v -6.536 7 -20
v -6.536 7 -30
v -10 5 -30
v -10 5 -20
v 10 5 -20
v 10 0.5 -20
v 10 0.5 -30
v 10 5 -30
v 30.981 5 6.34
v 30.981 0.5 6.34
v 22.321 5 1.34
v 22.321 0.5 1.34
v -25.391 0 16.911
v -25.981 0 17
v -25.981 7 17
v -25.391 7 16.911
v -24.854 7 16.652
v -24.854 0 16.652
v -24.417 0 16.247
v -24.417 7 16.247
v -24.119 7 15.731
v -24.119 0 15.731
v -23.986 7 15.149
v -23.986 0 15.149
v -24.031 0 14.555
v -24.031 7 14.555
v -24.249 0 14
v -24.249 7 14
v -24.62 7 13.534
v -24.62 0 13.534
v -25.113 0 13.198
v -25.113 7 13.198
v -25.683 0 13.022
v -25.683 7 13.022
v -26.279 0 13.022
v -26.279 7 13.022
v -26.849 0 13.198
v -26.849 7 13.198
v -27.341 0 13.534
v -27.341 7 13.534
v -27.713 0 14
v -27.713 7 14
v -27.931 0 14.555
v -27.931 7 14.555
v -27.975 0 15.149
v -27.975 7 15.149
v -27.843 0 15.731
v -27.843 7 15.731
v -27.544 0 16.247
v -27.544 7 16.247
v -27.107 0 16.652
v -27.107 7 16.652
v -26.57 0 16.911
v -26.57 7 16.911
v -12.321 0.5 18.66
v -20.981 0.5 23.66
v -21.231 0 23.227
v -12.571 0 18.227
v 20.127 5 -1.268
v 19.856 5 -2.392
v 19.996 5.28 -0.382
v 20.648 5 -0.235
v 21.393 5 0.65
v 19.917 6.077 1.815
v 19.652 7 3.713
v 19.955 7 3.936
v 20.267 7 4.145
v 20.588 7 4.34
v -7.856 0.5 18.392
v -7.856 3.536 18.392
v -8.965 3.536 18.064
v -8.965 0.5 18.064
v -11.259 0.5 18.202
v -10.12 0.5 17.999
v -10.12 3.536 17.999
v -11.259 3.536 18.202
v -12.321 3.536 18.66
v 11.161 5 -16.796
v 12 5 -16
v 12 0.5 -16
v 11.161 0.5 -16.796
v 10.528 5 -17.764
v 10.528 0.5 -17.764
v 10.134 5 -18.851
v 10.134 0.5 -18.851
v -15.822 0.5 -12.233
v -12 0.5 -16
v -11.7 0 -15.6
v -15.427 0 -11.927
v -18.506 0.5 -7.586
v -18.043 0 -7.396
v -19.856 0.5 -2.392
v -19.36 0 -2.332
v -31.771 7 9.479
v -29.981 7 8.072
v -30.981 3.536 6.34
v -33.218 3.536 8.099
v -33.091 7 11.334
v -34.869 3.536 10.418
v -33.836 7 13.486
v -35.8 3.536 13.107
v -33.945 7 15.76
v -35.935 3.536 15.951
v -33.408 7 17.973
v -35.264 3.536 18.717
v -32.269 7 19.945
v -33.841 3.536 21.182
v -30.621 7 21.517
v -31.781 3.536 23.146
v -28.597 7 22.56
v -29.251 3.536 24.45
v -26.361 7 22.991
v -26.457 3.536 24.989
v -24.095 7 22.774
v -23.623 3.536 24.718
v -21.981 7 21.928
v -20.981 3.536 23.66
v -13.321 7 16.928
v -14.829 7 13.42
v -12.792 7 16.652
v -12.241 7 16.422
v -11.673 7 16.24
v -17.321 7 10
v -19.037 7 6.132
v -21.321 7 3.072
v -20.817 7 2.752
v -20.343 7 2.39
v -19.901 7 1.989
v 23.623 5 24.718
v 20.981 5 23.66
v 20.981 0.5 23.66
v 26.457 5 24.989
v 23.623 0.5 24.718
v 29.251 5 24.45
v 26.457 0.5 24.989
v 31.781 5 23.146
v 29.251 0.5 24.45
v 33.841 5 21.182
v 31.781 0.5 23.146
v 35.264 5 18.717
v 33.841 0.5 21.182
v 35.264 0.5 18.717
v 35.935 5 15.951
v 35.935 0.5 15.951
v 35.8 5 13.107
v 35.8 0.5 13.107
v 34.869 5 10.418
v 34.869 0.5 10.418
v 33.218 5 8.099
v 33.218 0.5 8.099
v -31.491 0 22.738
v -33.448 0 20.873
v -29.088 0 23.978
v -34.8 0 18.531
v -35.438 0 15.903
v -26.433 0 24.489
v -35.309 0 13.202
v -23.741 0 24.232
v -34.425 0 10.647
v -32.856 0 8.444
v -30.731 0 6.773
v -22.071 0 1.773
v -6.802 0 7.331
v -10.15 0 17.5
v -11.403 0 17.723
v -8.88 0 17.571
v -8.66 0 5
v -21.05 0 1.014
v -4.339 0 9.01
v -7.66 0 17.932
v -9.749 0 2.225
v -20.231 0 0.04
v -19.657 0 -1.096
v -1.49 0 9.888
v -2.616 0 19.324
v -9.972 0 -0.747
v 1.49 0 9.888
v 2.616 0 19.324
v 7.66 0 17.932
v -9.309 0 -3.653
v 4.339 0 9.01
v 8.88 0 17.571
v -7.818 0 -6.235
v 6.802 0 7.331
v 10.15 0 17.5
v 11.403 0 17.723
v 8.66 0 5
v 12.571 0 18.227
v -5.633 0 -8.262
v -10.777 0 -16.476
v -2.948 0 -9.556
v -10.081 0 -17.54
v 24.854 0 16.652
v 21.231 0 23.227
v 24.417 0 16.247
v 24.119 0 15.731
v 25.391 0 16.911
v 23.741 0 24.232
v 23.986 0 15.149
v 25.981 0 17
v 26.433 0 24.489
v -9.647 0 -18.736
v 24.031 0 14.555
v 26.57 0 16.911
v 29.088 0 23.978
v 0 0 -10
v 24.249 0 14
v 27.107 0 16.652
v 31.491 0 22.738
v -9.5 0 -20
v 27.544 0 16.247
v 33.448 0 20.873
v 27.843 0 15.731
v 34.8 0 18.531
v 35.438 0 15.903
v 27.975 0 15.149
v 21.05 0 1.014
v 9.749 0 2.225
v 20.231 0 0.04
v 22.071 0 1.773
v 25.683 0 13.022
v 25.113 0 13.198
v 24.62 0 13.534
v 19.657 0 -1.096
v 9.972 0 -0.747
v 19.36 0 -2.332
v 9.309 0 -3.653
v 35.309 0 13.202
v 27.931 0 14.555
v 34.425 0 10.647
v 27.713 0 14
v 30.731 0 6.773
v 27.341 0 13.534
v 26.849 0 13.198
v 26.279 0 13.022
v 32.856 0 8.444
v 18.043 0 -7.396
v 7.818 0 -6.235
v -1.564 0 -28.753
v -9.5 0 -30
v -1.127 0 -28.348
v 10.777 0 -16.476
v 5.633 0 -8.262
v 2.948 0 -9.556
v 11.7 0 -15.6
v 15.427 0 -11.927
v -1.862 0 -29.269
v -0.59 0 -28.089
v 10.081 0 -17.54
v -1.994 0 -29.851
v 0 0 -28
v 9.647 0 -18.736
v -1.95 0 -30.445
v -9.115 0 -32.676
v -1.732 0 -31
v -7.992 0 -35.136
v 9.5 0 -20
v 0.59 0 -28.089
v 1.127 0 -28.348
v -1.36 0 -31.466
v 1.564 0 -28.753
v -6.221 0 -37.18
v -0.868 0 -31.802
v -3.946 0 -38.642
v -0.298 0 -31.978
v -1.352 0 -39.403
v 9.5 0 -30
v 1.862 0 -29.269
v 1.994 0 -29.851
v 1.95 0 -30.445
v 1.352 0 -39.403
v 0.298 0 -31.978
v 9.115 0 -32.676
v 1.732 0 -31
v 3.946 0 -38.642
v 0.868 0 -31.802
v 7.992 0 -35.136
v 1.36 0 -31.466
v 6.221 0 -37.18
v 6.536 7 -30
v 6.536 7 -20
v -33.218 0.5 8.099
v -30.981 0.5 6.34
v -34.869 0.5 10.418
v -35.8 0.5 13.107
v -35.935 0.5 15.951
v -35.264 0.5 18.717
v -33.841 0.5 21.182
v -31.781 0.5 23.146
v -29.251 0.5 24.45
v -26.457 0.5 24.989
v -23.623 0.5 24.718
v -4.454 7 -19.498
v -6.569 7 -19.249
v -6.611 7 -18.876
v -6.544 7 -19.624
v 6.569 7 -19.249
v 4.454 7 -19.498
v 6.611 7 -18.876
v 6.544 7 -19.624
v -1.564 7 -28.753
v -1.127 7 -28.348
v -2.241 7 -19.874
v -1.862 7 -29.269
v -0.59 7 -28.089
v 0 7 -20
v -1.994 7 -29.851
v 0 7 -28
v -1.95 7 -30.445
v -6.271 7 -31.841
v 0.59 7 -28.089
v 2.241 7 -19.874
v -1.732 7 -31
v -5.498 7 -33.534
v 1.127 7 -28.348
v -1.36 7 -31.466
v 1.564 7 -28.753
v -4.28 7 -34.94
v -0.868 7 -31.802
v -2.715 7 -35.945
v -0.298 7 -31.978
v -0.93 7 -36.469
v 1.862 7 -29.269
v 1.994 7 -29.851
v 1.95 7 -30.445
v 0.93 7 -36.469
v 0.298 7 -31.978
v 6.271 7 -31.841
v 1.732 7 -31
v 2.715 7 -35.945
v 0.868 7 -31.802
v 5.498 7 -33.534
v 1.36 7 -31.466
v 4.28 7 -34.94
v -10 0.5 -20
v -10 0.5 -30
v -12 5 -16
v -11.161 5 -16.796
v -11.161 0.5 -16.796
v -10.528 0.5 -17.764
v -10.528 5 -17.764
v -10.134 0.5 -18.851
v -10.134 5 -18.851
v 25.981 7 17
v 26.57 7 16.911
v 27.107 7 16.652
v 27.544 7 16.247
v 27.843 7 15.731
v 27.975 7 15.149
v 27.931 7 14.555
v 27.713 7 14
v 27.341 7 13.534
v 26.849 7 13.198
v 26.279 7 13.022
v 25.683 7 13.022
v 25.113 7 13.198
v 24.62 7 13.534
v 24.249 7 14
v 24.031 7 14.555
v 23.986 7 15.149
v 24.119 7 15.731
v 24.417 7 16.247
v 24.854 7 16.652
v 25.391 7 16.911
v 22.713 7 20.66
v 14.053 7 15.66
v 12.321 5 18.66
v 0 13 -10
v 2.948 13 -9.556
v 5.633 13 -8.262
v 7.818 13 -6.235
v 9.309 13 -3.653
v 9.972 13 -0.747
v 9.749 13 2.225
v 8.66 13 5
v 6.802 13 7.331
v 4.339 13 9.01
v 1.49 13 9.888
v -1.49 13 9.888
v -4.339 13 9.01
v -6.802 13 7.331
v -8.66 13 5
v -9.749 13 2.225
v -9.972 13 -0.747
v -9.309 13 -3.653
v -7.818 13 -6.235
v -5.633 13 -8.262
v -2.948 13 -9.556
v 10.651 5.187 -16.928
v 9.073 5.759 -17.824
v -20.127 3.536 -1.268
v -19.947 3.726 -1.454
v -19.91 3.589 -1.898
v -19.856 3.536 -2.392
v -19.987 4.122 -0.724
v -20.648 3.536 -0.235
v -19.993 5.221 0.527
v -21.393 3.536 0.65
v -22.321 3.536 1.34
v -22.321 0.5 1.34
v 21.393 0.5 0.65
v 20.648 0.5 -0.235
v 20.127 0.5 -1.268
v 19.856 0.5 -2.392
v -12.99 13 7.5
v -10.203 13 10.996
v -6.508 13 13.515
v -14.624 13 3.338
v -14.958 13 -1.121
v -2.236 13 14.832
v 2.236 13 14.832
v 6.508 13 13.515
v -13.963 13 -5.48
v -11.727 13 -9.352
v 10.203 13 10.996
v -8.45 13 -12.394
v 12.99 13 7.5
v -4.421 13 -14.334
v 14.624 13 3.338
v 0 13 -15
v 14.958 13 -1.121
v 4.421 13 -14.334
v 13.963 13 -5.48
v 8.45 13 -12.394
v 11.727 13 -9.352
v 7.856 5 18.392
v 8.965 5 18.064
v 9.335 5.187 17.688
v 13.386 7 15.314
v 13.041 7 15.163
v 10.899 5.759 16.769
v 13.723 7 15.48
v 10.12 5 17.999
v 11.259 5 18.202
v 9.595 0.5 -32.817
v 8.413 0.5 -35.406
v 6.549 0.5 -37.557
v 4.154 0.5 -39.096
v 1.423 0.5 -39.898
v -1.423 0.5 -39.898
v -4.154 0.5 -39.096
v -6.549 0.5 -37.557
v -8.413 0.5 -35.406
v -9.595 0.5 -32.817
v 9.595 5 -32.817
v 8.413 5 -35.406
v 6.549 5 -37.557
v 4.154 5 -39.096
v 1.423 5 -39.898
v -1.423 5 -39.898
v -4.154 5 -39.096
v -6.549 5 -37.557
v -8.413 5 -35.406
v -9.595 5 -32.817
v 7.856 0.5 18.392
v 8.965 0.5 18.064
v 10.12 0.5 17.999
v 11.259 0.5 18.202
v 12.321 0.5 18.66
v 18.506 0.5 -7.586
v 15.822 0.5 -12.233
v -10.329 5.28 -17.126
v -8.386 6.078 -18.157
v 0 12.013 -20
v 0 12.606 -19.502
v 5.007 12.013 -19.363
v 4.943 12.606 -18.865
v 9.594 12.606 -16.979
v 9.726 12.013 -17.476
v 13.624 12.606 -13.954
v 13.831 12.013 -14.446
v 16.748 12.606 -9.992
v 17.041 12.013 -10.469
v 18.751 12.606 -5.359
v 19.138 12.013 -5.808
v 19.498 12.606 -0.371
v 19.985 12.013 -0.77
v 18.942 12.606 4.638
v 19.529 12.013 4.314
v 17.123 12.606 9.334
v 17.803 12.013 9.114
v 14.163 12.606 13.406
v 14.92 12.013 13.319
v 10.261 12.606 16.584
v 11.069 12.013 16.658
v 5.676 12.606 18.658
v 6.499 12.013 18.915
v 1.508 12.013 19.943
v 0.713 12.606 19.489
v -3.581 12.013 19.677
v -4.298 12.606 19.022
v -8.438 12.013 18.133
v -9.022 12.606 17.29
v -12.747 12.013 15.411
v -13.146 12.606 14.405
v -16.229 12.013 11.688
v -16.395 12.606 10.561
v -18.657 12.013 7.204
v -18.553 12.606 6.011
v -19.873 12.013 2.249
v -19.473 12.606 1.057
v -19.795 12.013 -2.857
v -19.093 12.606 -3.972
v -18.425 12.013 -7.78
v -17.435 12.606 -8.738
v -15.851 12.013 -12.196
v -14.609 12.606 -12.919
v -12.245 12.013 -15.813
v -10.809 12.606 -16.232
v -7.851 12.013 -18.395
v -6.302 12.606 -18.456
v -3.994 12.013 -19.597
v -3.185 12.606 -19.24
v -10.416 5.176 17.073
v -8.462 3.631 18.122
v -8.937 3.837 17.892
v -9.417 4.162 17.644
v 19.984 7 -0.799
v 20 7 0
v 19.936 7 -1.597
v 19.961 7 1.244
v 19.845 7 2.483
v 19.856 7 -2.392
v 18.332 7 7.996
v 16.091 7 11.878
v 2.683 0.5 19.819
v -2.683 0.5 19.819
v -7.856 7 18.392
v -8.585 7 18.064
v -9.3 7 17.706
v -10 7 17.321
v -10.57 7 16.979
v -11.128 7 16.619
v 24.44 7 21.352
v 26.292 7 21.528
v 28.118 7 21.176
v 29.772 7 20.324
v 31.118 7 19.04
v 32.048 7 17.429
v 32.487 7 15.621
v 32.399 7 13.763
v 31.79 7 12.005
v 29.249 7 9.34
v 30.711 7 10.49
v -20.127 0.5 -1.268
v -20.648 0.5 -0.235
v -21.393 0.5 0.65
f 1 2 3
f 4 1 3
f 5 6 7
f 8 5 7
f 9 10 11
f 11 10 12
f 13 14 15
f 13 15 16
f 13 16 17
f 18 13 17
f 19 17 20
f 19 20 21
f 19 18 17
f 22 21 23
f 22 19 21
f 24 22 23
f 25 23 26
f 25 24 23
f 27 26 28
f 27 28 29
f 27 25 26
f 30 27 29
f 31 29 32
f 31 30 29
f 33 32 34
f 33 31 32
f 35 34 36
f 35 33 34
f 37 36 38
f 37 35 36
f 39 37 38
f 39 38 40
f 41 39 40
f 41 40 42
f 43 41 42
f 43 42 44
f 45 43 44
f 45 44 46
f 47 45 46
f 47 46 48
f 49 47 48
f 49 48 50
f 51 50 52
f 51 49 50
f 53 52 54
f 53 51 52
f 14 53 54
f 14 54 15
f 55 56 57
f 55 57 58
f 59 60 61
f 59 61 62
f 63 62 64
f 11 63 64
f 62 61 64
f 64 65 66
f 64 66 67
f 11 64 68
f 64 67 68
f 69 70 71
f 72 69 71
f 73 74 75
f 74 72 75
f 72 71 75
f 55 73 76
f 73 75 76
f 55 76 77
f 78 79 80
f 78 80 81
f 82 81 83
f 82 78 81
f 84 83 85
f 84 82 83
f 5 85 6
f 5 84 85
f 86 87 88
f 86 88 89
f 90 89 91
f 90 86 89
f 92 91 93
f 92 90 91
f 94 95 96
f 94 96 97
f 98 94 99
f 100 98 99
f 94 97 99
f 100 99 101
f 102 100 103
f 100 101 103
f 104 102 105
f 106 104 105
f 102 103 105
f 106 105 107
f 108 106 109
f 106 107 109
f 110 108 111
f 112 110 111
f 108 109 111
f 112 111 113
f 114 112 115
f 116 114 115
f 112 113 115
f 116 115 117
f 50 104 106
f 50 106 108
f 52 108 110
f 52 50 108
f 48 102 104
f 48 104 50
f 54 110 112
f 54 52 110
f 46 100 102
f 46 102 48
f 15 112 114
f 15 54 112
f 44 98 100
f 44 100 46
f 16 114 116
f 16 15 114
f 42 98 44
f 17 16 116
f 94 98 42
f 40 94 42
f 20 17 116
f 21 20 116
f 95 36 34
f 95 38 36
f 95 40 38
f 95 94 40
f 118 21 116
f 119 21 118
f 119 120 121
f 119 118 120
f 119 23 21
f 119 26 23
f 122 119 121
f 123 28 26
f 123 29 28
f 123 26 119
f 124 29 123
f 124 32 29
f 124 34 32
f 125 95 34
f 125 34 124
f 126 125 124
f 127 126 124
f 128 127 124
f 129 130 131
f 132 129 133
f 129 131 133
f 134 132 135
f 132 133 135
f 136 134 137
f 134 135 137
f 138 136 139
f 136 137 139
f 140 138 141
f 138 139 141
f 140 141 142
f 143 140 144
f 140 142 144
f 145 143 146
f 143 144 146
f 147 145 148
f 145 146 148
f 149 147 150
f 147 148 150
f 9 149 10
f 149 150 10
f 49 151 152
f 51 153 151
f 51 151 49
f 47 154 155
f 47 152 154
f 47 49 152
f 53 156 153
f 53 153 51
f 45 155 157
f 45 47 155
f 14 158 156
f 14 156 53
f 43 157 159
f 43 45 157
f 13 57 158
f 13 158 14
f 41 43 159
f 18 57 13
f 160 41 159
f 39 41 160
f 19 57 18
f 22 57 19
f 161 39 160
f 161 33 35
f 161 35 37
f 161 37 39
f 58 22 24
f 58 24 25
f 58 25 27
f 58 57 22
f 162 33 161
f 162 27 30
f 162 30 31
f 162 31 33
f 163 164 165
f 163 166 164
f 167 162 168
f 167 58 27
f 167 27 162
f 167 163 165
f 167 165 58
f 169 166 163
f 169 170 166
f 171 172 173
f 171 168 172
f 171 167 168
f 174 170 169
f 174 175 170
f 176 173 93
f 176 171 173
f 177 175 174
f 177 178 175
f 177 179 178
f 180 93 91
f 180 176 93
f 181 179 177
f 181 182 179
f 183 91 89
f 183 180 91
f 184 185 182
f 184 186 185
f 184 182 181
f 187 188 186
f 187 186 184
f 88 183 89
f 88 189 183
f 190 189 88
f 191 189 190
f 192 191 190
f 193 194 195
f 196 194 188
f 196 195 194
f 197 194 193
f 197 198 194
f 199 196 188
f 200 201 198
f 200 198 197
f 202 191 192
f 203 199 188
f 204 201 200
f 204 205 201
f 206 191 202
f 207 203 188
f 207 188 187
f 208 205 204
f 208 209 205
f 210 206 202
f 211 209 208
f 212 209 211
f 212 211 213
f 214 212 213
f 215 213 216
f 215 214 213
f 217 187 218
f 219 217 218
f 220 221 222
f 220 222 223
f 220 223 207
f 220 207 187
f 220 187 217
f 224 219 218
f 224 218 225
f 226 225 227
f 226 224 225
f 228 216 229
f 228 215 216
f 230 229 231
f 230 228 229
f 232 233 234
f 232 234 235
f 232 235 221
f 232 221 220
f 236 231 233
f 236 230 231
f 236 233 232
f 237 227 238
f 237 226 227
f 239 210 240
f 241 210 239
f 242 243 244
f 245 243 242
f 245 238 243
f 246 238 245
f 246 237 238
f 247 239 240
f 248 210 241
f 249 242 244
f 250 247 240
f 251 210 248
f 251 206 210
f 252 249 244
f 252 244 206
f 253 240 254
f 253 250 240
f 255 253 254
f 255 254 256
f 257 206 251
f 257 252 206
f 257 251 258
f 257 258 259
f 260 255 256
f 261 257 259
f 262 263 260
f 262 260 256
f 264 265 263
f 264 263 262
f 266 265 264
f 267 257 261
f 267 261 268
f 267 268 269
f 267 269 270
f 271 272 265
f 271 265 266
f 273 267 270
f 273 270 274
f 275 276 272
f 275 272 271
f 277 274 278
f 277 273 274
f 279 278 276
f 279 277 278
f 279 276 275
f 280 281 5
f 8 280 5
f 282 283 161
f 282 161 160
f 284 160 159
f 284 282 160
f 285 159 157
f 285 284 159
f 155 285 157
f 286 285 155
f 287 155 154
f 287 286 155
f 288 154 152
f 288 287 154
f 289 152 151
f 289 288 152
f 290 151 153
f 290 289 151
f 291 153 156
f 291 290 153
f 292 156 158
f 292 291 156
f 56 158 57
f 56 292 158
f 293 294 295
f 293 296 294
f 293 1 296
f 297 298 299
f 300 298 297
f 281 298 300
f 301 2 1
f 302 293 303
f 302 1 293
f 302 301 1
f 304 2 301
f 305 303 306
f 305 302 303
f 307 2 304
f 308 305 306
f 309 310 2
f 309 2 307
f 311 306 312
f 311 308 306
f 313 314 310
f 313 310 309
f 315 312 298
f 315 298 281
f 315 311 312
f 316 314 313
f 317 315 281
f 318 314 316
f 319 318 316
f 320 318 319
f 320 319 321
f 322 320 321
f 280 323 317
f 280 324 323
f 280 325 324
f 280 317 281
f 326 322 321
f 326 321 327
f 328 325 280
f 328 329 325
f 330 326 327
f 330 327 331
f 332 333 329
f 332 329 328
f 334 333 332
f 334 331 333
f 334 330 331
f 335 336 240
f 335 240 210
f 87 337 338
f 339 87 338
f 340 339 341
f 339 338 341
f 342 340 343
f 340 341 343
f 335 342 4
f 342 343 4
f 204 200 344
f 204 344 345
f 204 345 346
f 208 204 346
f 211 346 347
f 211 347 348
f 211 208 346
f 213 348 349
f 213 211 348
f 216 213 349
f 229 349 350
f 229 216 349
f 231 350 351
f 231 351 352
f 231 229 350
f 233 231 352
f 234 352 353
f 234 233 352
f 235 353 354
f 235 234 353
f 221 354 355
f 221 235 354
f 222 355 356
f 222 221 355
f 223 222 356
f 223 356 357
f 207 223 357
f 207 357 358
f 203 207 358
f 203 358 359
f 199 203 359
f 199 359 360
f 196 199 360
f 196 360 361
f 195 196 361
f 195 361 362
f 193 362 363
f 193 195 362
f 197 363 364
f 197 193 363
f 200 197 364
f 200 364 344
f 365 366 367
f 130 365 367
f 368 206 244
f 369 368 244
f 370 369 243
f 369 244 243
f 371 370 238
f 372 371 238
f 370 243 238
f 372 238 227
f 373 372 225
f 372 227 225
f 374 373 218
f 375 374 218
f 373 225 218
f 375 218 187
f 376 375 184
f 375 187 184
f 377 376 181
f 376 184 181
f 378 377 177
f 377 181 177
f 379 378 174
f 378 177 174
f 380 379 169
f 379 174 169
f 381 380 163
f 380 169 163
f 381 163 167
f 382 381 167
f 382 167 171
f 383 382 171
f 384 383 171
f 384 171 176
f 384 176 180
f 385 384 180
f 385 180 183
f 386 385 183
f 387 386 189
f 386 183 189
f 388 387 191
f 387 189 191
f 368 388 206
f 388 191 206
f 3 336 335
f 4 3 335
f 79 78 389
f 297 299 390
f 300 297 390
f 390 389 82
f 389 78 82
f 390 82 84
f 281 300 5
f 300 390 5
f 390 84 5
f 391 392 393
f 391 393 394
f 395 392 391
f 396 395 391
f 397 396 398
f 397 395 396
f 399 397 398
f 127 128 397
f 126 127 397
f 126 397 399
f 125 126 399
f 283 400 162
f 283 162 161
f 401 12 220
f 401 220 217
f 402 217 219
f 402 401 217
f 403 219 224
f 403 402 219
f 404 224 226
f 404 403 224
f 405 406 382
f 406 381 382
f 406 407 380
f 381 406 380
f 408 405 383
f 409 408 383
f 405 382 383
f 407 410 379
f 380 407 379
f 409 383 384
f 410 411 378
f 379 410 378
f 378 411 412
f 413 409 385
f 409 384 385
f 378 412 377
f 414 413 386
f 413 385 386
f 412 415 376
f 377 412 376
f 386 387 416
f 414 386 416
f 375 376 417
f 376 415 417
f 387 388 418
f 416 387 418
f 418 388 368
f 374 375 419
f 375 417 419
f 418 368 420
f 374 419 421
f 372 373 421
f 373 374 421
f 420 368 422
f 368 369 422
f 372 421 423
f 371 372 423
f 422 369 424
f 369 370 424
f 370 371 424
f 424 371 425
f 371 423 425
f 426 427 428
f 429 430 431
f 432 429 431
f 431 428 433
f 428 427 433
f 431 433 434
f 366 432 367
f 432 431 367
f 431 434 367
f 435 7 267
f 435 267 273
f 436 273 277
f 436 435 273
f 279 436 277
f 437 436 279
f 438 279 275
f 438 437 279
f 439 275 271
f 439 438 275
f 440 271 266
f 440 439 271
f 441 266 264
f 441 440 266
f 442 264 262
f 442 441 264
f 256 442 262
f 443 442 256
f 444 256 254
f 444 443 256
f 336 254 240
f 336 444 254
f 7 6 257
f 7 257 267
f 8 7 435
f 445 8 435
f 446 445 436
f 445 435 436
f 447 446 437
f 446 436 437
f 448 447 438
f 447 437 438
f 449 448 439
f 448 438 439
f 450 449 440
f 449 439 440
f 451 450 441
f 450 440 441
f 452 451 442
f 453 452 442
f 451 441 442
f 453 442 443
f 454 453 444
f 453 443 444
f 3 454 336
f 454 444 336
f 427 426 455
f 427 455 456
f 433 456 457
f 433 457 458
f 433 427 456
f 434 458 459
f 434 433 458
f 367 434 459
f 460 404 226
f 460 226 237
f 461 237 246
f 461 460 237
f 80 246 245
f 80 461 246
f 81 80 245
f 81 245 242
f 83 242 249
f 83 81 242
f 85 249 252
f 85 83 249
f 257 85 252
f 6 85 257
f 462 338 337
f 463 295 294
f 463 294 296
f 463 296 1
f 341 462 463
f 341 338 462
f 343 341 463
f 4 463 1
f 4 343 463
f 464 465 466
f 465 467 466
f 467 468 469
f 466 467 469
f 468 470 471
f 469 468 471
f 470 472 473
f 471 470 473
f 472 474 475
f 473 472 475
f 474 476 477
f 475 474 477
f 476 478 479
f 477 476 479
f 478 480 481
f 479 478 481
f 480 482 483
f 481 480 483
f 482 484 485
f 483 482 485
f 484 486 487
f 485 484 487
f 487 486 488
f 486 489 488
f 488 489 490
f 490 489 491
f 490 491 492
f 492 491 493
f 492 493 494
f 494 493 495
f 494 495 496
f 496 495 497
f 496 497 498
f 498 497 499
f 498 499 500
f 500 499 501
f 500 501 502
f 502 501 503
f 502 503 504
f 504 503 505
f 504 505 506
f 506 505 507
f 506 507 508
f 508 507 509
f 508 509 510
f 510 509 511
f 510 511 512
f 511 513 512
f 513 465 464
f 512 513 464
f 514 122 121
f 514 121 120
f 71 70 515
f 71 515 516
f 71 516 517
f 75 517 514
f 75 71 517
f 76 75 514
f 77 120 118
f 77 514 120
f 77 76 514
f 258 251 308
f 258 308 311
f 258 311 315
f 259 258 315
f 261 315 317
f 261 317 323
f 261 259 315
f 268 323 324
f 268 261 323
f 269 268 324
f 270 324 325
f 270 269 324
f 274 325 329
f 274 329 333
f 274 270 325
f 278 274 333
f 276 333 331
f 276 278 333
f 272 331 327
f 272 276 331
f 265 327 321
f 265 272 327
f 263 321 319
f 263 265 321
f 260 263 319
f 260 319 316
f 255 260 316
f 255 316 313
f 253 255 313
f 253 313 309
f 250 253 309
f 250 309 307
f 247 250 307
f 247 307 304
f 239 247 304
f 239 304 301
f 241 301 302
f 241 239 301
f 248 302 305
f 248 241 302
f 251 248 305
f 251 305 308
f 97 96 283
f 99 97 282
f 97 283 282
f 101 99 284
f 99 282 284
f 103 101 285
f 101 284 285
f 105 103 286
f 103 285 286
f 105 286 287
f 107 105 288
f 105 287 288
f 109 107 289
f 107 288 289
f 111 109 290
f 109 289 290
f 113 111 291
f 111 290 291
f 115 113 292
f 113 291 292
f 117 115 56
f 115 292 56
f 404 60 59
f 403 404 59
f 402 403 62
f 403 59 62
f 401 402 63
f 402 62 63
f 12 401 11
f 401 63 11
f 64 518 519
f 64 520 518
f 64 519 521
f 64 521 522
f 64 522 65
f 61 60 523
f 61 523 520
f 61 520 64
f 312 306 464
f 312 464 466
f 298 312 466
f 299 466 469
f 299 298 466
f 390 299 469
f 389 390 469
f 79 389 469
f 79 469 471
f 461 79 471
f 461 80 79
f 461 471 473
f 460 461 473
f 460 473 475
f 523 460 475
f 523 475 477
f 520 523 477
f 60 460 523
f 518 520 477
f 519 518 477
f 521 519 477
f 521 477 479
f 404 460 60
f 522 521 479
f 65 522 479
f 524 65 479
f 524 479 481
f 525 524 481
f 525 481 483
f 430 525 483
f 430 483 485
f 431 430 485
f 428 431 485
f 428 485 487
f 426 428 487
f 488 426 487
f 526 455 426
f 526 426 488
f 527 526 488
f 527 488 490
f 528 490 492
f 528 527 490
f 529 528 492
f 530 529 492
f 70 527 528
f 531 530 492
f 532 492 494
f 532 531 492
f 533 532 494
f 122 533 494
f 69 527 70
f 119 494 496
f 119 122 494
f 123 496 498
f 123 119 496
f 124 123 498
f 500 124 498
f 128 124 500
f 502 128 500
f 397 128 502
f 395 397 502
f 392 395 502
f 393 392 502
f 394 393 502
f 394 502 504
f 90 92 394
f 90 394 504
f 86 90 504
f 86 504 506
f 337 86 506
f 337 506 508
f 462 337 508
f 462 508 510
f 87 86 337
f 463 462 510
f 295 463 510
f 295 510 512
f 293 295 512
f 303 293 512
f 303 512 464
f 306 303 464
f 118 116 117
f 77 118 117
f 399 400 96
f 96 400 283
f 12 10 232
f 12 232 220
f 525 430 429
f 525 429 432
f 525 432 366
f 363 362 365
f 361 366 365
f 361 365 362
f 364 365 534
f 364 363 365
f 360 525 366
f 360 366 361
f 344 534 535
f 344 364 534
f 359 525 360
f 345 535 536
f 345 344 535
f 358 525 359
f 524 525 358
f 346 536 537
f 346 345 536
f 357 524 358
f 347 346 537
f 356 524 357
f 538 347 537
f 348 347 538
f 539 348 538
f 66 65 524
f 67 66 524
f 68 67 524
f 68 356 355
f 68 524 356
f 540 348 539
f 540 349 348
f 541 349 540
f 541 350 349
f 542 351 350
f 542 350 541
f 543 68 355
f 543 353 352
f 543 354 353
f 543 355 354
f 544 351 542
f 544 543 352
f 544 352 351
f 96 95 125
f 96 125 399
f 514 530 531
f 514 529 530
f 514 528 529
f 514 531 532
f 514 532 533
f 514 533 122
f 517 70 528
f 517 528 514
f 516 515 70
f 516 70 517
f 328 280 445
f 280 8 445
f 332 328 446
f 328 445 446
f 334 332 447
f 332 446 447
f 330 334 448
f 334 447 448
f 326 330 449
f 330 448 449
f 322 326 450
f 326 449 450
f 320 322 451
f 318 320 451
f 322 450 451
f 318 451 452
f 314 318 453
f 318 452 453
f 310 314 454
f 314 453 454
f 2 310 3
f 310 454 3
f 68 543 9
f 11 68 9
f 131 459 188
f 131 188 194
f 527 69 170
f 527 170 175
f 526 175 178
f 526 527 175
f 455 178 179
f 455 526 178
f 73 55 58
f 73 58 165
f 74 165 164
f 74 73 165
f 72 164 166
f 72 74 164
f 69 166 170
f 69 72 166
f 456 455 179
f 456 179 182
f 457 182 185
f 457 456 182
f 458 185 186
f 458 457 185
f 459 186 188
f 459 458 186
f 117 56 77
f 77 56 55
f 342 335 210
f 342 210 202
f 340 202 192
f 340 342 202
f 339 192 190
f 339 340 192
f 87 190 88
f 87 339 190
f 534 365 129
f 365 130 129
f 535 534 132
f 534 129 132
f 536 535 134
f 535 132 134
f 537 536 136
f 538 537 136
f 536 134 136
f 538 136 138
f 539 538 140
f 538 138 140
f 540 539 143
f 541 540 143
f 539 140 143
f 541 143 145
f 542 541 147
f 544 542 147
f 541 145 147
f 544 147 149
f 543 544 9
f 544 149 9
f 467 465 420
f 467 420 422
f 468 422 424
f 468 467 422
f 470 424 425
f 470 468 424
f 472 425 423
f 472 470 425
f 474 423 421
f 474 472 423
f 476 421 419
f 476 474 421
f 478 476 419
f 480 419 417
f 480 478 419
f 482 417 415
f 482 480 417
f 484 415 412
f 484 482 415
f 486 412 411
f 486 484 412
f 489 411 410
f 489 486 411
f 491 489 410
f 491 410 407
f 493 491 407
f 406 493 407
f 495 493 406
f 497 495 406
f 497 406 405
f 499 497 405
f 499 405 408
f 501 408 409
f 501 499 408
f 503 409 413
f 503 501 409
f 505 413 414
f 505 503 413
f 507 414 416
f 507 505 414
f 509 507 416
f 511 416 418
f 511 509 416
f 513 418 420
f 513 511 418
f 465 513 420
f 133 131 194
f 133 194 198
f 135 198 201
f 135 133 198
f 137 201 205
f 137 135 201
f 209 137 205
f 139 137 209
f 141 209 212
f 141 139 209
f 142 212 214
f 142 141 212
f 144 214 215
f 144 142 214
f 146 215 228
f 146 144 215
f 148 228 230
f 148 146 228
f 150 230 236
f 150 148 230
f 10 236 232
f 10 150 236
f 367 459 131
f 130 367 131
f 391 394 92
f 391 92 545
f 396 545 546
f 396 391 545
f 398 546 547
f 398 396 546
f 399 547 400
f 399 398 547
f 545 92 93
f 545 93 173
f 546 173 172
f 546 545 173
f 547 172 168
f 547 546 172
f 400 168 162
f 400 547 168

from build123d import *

# Parameters (mm, degrees)
SKETCH_2_R        = 2
EXTRUDE_1_DEPTH   = 7
EXTRUDE_1_2_DEPTH = 7
EXTRUDE_1_3_DEPTH = 7
SKETCH_3_R        = 20
SKETCH_3_R_2      = 10
EXTRUDE_2_DEPTH   = 13
FILLET_1_R        = 5
CHAMFER_1_SIZE    = 5
CHAMFER_1_SIZE2   = 0.437443318
CHAMFER_2_SIZE    = 3.464101615
CHAMFER_2_SIZE_2  = 2
CHAMFER_3_SIZE    = 0.5
CHAMFER_4_SIZE    = 0.5
CHAMFER_4_SIZE2   = 0.550031434


with BuildPart() as part:
    # ｽｹｯﾁ2 → ﾎﾞｽ - 押し出し1 (new body)
    with BuildSketch(Plane(origin=(0, 0, 0), x_dir=(1, 0, 0), z_dir=(0, 1, 0))):
        with BuildLine():
            Line((10, -17.320508076), (20.980762114, -23.660254038))
            ThreePointArc((20.980762114, -23.660254038), (34.641016151, -20), (30.980762114, -6.339745962))
            Line((30.980762114, -6.339745962), (20, 0))
            ThreePointArc((20, 0), (17.320508076, -10), (10, -17.320508076))
        make_face()
        with Locations(Location((25.980762114, -15, 0), (0, 0, 270))):
            Circle(SKETCH_2_R, mode=Mode.SUBTRACT)
    extrude(amount=EXTRUDE_1_DEPTH)



with BuildPart() as body_2:
    # ｽｹｯﾁ2 → Extrude 1 2 (new body)
    with BuildSketch(Plane(origin=(0, 0, 0), x_dir=(1, 0, 0), z_dir=(0, 1, 0))):
        with BuildLine():
            Line((-20.980762114, -23.660254038), (-10, -17.320508076))
            ThreePointArc((-10, -17.320508076), (-17.320508076, -10), (-20, 0))
            Line((-20, 0), (-30.980762114, -6.339745962))
            ThreePointArc((-30.980762114, -6.339745962), (-34.641016151, -20), (-20.980762114, -23.660254038))
        make_face()
        with Locations(Location((-25.980762114, -15, 0), (0, 0, 270))):
            Circle(SKETCH_2_R, mode=Mode.SUBTRACT)
    extrude(amount=EXTRUDE_1_2_DEPTH)


with BuildPart() as body_3:
    # ｽｹｯﾁ2 → Extrude 1 3 (new body)
    with BuildSketch(Plane(origin=(0, 0, 0), x_dir=(1, 0, 0), z_dir=(0, 1, 0))):
        with BuildLine():
            ThreePointArc((-10, 17.320508076), (0, 20), (10, 17.320508076))
            Line((10, 17.320508076), (10, 30))
            ThreePointArc((10, 30), (0, 40), (-10, 30))
            Line((-10, 30), (-10, 17.320508076))
        make_face()
        with Locations(Location((0, 30, 0), (0, 0, 270))):
            Circle(SKETCH_2_R, mode=Mode.SUBTRACT)
    extrude(amount=EXTRUDE_1_3_DEPTH)


with BuildPart() as part_1:
    add(part.part)

    add(body_2.part)  # ﾎﾞｽ - 押し出し2 merges body 2

    add(body_3.part)  # ﾎﾞｽ - 押し出し2 merges body 3
    # ｽｹｯﾁ3 → ﾎﾞｽ - 押し出し2 (add)
    with BuildSketch(Plane.XZ):
        with Locations(Location((0, 0, 0), (0, 0, 270))):
            Circle(SKETCH_3_R)
        with Locations(Location((0, 0, 0), (0, 0, 270))):
            Circle(SKETCH_3_R_2, mode=Mode.SUBTRACT)
    extrude(amount=-EXTRUDE_2_DEPTH)

    # ﾌｨﾚｯﾄ1
    fillet_1_edges = [part_1.edges().sort_by_distance(p)[0] for p in [
        (10, 3.5, 17.320508076),
        (20, 3.5, 0),
        (-10, 3.5, 17.320508076),
        (-20, 3.5, 0),
        (-10, 3.5, -17.320508076),
        (10, 3.5, -17.320508076),
    ]]
    fillet(fillet_1_edges, radius=FILLET_1_R)

    # 面取り1
    chamfer_1_edges = [part_1.edges().sort_by_distance(p)[0] for p in [
        (0, 13, 20),
    ]]
    chamfer_1_side = [part_1.faces().sort_by_distance(p)[0] for p in [
        (0, 13, 19.434314575),
    ]]
    chamfer(chamfer_1_edges, length=CHAMFER_1_SIZE, length2=CHAMFER_1_SIZE2, reference=chamfer_1_side[0])

    # 面取り2
    # the kernel refuses this chamfer: 3.464101615, 2 mm, written as the material it takes off along each edge
    with BuildSketch(Plane(origin=(12.320508076, 7, 18.660254038), x_dir=(0.4999066103111042, 0.01932676561270069, -0.8658636480983676), z_dir=(0.8660254037844386, 0, 0.5000000000000003)), Plane(origin=(10, 7, -20), x_dir=(-0.9998132206222079, 0.01932676561270069, 0), z_dir=(0, 0, -1)), Plane(origin=(-10, 7, -30), x_dir=(0.9998132206222079, 0.01932676561270069, 0), z_dir=(0, 0, 1)), Plane(origin=(30.980762114, 7, 6.339745962), x_dir=(-0.4999066103111044, 0.01932676561270069, 0.8658636480983674), z_dir=(-0.8660254037844385, 0, -0.5000000000000004))) as chamfer_2_piece_1:
        Polygon((CHAMFER_2_SIZE * 0.999813220662, -CHAMFER_2_SIZE * 0.0193267656135), (-CHAMFER_2_SIZE_2 * 0.0193267656127, -CHAMFER_2_SIZE_2 * 0.999813220622), (0, 0), align=None)
    extrude(amount=10, mode=Mode.SUBTRACT)
    with BuildSketch(Plane(origin=(-25.980762114, 7, 15), x_dir=(-0.5000000000000021, 0, -0.8660254037844373), z_dir=(0.8660254037844373, 0, -0.5000000000000021))) as chamfer_2_piece_2:
        Polygon((10 - CHAMFER_2_SIZE_2, 0), (10, -CHAMFER_2_SIZE), (10, 0), align=None)
    revolve(axis=Axis((-25.980762114, 7, 15), (0, 1, 0)), revolution_arc=180, mode=Mode.SUBTRACT)
    with BuildSketch(Plane(origin=(-22.320508076, 7, 1.339745962), x_dir=(0.49916137187689635, 0.05789386240267152, 0.8645728572665669), z_dir=(-0.8660254037844386, 0, 0.5000000000000001)), Plane(origin=(-20.980762114, 7, 23.660254038), x_dir=(-0.4991613718768962, 0.057893862402671505, -0.8645728572665671), z_dir=(0.8660254037844387, 0, -0.49999999999999983))) as chamfer_2_piece_3:
        Polygon((CHAMFER_2_SIZE_2 * 0.998322743754, -CHAMFER_2_SIZE_2 * 0.0578938624027), (-CHAMFER_2_SIZE * 0.057893862405, -CHAMFER_2_SIZE * 0.998322743793), (0, 0), align=None)
    extrude(amount=10, mode=Mode.SUBTRACT)
    with BuildSketch(Plane(origin=(-24.820508076, 7, -2.990381057), x_dir=(-0.10176135112534013, 0, -0.9948088396356083), z_dir=(-0.9948088396356083, 0, 0.10176135112534013))) as chamfer_2_piece_4_section:
        Polygon((5, CHAMFER_2_SIZE), (5 + CHAMFER_2_SIZE_2, 0), (5, 0), align=None)
    chamfer_2_piece_4 = revolve(axis=Axis((-24.820508076, 7, -2.990381057), (0, -1, 0)), revolution_arc=155.840605946, mode=Mode.PRIVATE)
    chamfer_2_piece_4 = chamfer_2_piece_4 - Plane(origin=(0, 5.431561908, 0), x_dir=(0, 0, -1), z_dir=(0, -1, 0)) * Cylinder(20, 28, mode=Mode.PRIVATE)
    add(chamfer_2_piece_4, mode=Mode.SUBTRACT)
    with BuildSketch(Plane(origin=(-9.820508076, 7, 22.990381057), x_dir=(0.8106490514710499, 0, 0.5855323350158272), z_dir=(-0.5855323350158272, 0, 0.8106490514710499))) as chamfer_2_piece_5_section:
        Polygon((5 + CHAMFER_2_SIZE_2, 0), (5, -CHAMFER_2_SIZE), (5, 0), align=None)
    chamfer_2_piece_5 = revolve(axis=Axis((-9.820508076, 7, 22.990381057), (0, 1, 0)), revolution_arc=155.840605946, mode=Mode.PRIVATE)
    chamfer_2_piece_5 = chamfer_2_piece_5 - Plane(origin=(0, 5.431562064, 0), x_dir=(0, 0, -1), z_dir=(0, -1, 0)) * Cylinder(20, 29, mode=Mode.PRIVATE)
    add(chamfer_2_piece_5, mode=Mode.SUBTRACT)
    with BuildSketch(Plane(origin=(0, 7, -30), x_dir=(1, 0, 0), z_dir=(0, 0, 1))) as chamfer_2_piece_6:
        Polygon((10 - CHAMFER_2_SIZE, 0), (10, -CHAMFER_2_SIZE_2), (10, 0), align=None)
    revolve(axis=Axis((0, 7, -30), (0, 1, 0)), revolution_arc=180, mode=Mode.SUBTRACT)
    with BuildSketch(Plane(origin=(25.980762114, 7, 15), x_dir=(-0.4999999999999975, 0, 0.8660254037844399), z_dir=(-0.8660254037844399, 0, -0.4999999999999975))) as chamfer_2_piece_7:
        Polygon((10 - CHAMFER_2_SIZE, 0), (10, -CHAMFER_2_SIZE_2), (10, 0), align=None)
    revolve(axis=Axis((25.980762114, 7, 15), (0, 1, 0)), revolution_arc=180, mode=Mode.SUBTRACT)
    with BuildSketch(Plane(origin=(-15, 7, -20), x_dir=(-0.9124104025964815, 0, 0.40927650461970855), z_dir=(-0.40927650461970855, 0, -0.9124104025964815))) as chamfer_2_piece_8_section:
        Polygon((5 + CHAMFER_2_SIZE, 0), (5, -CHAMFER_2_SIZE_2), (5, 0), align=None)
    chamfer_2_piece_8 = revolve(axis=Axis((-15, 7, -20), (0, 1, 0)), revolution_arc=155.840605946, mode=Mode.PRIVATE)
    chamfer_2_piece_8 = chamfer_2_piece_8 - Plane(origin=(0, 6.05627025, 0), x_dir=(0, 0, -1), z_dir=(0, -1, 0)) * Cylinder(20, 34, mode=Mode.PRIVATE)
    add(chamfer_2_piece_8, mode=Mode.SUBTRACT)
    with BuildSketch(Plane(origin=(9.820508076, 7, 22.990381057), x_dir=(-0.8106490514711084, 0, 0.5855323350157463), z_dir=(0.5855323350157463, 0, 0.8106490514711084))) as chamfer_2_piece_9_section:
        Polygon((5 + CHAMFER_2_SIZE, 0), (5, CHAMFER_2_SIZE_2), (5, 0), align=None)
    chamfer_2_piece_9 = revolve(axis=Axis((9.820508076, 7, 22.990381057), (0, -1, 0)), revolution_arc=155.840605946, mode=Mode.PRIVATE)
    chamfer_2_piece_9 = chamfer_2_piece_9 - Plane(origin=(0, 6.056270332, 0), x_dir=(0, 0, -1), z_dir=(0, -1, 0)) * Cylinder(20, 34, mode=Mode.PRIVATE)
    add(chamfer_2_piece_9, mode=Mode.SUBTRACT)
    with BuildSketch(Plane(origin=(24.820508076, 7, -2.990381057), x_dir=(0.1017613511254389, 0, -0.9948088396355981), z_dir=(0.9948088396355981, 0, 0.1017613511254389))) as chamfer_2_piece_10_section:
        Polygon((5, -CHAMFER_2_SIZE_2), (5 + CHAMFER_2_SIZE, 0), (5, 0), align=None)
    chamfer_2_piece_10 = revolve(axis=Axis((24.820508076, 7, -2.990381057), (0, 1, 0)), revolution_arc=155.840605946, mode=Mode.PRIVATE)
    chamfer_2_piece_10 = chamfer_2_piece_10 - Plane(origin=(0, 6.056270131, 0), x_dir=(0, 0, -1), z_dir=(0, -1, 0)) * Cylinder(20, 34, mode=Mode.PRIVATE)
    add(chamfer_2_piece_10, mode=Mode.SUBTRACT)
    with BuildSketch(Plane(origin=(15, 7, -20), x_dir=(0.9124104025963968, 0, 0.4092765046198976), z_dir=(0.4092765046198976, 0, -0.9124104025963968))) as chamfer_2_piece_11_section:
        Polygon((5 + CHAMFER_2_SIZE, 0), (5, CHAMFER_2_SIZE_2), (5, 0), align=None)
    chamfer_2_piece_11 = revolve(axis=Axis((15, 7, -20), (0, -1, 0)), revolution_arc=155.840605946, mode=Mode.PRIVATE)
    chamfer_2_piece_11 = chamfer_2_piece_11 - Plane(origin=(0, 6.056270339, 0), x_dir=(0, 0, -1), z_dir=(0, -1, 0)) * Cylinder(20, 34, mode=Mode.PRIVATE)
    add(chamfer_2_piece_11, mode=Mode.SUBTRACT)

    # 面取り3
    chamfer_3_edges = [part_1.edges().sort_by_distance(p)[0] for p in [
        (-16.650635095, 0, 21.160254038),
        (-34.641016151, 0, 20),
        (-26.650635095, 0, 3.839745962),
        (-10, 0, -25),
        (0, 0, -40),
        (10, 0, -25),
        (-17.320508076, 0, -10),
        (0, 0, 20),
        (17.320508076, 0, -10),
        (-10.527864045, 0, -17.763932023),
        (-20.647948425, 0, -0.235431699),
        (-10.12008438, 0, 17.999363722),
        (10.12008438, 0, 17.999363722),
        (20.647948425, 0, -0.235431699),
        (16.650635095, 0, 21.160254038),
        (10.527864045, 0, -17.763932022),
        (26.650635095, 0, 3.839745962),
        (34.641016151, 0, 20),
    ]]
    chamfer(chamfer_3_edges, length=CHAMFER_3_SIZE)

    # 面取り4
    chamfer_4_edges = [part_1.edges().sort_by_distance(p)[0] for p in [
        (0, 12.562556682, 20),
    ]]
    chamfer_4_side = [part_1.faces().sort_by_distance(p)[0] for p in [
        (0, 12.781278341, 17.5),
    ]]
    chamfer(chamfer_4_edges, length=CHAMFER_4_SIZE, length2=CHAMFER_4_SIZE2, reference=chamfer_4_side[0])


solid = part_1.part
